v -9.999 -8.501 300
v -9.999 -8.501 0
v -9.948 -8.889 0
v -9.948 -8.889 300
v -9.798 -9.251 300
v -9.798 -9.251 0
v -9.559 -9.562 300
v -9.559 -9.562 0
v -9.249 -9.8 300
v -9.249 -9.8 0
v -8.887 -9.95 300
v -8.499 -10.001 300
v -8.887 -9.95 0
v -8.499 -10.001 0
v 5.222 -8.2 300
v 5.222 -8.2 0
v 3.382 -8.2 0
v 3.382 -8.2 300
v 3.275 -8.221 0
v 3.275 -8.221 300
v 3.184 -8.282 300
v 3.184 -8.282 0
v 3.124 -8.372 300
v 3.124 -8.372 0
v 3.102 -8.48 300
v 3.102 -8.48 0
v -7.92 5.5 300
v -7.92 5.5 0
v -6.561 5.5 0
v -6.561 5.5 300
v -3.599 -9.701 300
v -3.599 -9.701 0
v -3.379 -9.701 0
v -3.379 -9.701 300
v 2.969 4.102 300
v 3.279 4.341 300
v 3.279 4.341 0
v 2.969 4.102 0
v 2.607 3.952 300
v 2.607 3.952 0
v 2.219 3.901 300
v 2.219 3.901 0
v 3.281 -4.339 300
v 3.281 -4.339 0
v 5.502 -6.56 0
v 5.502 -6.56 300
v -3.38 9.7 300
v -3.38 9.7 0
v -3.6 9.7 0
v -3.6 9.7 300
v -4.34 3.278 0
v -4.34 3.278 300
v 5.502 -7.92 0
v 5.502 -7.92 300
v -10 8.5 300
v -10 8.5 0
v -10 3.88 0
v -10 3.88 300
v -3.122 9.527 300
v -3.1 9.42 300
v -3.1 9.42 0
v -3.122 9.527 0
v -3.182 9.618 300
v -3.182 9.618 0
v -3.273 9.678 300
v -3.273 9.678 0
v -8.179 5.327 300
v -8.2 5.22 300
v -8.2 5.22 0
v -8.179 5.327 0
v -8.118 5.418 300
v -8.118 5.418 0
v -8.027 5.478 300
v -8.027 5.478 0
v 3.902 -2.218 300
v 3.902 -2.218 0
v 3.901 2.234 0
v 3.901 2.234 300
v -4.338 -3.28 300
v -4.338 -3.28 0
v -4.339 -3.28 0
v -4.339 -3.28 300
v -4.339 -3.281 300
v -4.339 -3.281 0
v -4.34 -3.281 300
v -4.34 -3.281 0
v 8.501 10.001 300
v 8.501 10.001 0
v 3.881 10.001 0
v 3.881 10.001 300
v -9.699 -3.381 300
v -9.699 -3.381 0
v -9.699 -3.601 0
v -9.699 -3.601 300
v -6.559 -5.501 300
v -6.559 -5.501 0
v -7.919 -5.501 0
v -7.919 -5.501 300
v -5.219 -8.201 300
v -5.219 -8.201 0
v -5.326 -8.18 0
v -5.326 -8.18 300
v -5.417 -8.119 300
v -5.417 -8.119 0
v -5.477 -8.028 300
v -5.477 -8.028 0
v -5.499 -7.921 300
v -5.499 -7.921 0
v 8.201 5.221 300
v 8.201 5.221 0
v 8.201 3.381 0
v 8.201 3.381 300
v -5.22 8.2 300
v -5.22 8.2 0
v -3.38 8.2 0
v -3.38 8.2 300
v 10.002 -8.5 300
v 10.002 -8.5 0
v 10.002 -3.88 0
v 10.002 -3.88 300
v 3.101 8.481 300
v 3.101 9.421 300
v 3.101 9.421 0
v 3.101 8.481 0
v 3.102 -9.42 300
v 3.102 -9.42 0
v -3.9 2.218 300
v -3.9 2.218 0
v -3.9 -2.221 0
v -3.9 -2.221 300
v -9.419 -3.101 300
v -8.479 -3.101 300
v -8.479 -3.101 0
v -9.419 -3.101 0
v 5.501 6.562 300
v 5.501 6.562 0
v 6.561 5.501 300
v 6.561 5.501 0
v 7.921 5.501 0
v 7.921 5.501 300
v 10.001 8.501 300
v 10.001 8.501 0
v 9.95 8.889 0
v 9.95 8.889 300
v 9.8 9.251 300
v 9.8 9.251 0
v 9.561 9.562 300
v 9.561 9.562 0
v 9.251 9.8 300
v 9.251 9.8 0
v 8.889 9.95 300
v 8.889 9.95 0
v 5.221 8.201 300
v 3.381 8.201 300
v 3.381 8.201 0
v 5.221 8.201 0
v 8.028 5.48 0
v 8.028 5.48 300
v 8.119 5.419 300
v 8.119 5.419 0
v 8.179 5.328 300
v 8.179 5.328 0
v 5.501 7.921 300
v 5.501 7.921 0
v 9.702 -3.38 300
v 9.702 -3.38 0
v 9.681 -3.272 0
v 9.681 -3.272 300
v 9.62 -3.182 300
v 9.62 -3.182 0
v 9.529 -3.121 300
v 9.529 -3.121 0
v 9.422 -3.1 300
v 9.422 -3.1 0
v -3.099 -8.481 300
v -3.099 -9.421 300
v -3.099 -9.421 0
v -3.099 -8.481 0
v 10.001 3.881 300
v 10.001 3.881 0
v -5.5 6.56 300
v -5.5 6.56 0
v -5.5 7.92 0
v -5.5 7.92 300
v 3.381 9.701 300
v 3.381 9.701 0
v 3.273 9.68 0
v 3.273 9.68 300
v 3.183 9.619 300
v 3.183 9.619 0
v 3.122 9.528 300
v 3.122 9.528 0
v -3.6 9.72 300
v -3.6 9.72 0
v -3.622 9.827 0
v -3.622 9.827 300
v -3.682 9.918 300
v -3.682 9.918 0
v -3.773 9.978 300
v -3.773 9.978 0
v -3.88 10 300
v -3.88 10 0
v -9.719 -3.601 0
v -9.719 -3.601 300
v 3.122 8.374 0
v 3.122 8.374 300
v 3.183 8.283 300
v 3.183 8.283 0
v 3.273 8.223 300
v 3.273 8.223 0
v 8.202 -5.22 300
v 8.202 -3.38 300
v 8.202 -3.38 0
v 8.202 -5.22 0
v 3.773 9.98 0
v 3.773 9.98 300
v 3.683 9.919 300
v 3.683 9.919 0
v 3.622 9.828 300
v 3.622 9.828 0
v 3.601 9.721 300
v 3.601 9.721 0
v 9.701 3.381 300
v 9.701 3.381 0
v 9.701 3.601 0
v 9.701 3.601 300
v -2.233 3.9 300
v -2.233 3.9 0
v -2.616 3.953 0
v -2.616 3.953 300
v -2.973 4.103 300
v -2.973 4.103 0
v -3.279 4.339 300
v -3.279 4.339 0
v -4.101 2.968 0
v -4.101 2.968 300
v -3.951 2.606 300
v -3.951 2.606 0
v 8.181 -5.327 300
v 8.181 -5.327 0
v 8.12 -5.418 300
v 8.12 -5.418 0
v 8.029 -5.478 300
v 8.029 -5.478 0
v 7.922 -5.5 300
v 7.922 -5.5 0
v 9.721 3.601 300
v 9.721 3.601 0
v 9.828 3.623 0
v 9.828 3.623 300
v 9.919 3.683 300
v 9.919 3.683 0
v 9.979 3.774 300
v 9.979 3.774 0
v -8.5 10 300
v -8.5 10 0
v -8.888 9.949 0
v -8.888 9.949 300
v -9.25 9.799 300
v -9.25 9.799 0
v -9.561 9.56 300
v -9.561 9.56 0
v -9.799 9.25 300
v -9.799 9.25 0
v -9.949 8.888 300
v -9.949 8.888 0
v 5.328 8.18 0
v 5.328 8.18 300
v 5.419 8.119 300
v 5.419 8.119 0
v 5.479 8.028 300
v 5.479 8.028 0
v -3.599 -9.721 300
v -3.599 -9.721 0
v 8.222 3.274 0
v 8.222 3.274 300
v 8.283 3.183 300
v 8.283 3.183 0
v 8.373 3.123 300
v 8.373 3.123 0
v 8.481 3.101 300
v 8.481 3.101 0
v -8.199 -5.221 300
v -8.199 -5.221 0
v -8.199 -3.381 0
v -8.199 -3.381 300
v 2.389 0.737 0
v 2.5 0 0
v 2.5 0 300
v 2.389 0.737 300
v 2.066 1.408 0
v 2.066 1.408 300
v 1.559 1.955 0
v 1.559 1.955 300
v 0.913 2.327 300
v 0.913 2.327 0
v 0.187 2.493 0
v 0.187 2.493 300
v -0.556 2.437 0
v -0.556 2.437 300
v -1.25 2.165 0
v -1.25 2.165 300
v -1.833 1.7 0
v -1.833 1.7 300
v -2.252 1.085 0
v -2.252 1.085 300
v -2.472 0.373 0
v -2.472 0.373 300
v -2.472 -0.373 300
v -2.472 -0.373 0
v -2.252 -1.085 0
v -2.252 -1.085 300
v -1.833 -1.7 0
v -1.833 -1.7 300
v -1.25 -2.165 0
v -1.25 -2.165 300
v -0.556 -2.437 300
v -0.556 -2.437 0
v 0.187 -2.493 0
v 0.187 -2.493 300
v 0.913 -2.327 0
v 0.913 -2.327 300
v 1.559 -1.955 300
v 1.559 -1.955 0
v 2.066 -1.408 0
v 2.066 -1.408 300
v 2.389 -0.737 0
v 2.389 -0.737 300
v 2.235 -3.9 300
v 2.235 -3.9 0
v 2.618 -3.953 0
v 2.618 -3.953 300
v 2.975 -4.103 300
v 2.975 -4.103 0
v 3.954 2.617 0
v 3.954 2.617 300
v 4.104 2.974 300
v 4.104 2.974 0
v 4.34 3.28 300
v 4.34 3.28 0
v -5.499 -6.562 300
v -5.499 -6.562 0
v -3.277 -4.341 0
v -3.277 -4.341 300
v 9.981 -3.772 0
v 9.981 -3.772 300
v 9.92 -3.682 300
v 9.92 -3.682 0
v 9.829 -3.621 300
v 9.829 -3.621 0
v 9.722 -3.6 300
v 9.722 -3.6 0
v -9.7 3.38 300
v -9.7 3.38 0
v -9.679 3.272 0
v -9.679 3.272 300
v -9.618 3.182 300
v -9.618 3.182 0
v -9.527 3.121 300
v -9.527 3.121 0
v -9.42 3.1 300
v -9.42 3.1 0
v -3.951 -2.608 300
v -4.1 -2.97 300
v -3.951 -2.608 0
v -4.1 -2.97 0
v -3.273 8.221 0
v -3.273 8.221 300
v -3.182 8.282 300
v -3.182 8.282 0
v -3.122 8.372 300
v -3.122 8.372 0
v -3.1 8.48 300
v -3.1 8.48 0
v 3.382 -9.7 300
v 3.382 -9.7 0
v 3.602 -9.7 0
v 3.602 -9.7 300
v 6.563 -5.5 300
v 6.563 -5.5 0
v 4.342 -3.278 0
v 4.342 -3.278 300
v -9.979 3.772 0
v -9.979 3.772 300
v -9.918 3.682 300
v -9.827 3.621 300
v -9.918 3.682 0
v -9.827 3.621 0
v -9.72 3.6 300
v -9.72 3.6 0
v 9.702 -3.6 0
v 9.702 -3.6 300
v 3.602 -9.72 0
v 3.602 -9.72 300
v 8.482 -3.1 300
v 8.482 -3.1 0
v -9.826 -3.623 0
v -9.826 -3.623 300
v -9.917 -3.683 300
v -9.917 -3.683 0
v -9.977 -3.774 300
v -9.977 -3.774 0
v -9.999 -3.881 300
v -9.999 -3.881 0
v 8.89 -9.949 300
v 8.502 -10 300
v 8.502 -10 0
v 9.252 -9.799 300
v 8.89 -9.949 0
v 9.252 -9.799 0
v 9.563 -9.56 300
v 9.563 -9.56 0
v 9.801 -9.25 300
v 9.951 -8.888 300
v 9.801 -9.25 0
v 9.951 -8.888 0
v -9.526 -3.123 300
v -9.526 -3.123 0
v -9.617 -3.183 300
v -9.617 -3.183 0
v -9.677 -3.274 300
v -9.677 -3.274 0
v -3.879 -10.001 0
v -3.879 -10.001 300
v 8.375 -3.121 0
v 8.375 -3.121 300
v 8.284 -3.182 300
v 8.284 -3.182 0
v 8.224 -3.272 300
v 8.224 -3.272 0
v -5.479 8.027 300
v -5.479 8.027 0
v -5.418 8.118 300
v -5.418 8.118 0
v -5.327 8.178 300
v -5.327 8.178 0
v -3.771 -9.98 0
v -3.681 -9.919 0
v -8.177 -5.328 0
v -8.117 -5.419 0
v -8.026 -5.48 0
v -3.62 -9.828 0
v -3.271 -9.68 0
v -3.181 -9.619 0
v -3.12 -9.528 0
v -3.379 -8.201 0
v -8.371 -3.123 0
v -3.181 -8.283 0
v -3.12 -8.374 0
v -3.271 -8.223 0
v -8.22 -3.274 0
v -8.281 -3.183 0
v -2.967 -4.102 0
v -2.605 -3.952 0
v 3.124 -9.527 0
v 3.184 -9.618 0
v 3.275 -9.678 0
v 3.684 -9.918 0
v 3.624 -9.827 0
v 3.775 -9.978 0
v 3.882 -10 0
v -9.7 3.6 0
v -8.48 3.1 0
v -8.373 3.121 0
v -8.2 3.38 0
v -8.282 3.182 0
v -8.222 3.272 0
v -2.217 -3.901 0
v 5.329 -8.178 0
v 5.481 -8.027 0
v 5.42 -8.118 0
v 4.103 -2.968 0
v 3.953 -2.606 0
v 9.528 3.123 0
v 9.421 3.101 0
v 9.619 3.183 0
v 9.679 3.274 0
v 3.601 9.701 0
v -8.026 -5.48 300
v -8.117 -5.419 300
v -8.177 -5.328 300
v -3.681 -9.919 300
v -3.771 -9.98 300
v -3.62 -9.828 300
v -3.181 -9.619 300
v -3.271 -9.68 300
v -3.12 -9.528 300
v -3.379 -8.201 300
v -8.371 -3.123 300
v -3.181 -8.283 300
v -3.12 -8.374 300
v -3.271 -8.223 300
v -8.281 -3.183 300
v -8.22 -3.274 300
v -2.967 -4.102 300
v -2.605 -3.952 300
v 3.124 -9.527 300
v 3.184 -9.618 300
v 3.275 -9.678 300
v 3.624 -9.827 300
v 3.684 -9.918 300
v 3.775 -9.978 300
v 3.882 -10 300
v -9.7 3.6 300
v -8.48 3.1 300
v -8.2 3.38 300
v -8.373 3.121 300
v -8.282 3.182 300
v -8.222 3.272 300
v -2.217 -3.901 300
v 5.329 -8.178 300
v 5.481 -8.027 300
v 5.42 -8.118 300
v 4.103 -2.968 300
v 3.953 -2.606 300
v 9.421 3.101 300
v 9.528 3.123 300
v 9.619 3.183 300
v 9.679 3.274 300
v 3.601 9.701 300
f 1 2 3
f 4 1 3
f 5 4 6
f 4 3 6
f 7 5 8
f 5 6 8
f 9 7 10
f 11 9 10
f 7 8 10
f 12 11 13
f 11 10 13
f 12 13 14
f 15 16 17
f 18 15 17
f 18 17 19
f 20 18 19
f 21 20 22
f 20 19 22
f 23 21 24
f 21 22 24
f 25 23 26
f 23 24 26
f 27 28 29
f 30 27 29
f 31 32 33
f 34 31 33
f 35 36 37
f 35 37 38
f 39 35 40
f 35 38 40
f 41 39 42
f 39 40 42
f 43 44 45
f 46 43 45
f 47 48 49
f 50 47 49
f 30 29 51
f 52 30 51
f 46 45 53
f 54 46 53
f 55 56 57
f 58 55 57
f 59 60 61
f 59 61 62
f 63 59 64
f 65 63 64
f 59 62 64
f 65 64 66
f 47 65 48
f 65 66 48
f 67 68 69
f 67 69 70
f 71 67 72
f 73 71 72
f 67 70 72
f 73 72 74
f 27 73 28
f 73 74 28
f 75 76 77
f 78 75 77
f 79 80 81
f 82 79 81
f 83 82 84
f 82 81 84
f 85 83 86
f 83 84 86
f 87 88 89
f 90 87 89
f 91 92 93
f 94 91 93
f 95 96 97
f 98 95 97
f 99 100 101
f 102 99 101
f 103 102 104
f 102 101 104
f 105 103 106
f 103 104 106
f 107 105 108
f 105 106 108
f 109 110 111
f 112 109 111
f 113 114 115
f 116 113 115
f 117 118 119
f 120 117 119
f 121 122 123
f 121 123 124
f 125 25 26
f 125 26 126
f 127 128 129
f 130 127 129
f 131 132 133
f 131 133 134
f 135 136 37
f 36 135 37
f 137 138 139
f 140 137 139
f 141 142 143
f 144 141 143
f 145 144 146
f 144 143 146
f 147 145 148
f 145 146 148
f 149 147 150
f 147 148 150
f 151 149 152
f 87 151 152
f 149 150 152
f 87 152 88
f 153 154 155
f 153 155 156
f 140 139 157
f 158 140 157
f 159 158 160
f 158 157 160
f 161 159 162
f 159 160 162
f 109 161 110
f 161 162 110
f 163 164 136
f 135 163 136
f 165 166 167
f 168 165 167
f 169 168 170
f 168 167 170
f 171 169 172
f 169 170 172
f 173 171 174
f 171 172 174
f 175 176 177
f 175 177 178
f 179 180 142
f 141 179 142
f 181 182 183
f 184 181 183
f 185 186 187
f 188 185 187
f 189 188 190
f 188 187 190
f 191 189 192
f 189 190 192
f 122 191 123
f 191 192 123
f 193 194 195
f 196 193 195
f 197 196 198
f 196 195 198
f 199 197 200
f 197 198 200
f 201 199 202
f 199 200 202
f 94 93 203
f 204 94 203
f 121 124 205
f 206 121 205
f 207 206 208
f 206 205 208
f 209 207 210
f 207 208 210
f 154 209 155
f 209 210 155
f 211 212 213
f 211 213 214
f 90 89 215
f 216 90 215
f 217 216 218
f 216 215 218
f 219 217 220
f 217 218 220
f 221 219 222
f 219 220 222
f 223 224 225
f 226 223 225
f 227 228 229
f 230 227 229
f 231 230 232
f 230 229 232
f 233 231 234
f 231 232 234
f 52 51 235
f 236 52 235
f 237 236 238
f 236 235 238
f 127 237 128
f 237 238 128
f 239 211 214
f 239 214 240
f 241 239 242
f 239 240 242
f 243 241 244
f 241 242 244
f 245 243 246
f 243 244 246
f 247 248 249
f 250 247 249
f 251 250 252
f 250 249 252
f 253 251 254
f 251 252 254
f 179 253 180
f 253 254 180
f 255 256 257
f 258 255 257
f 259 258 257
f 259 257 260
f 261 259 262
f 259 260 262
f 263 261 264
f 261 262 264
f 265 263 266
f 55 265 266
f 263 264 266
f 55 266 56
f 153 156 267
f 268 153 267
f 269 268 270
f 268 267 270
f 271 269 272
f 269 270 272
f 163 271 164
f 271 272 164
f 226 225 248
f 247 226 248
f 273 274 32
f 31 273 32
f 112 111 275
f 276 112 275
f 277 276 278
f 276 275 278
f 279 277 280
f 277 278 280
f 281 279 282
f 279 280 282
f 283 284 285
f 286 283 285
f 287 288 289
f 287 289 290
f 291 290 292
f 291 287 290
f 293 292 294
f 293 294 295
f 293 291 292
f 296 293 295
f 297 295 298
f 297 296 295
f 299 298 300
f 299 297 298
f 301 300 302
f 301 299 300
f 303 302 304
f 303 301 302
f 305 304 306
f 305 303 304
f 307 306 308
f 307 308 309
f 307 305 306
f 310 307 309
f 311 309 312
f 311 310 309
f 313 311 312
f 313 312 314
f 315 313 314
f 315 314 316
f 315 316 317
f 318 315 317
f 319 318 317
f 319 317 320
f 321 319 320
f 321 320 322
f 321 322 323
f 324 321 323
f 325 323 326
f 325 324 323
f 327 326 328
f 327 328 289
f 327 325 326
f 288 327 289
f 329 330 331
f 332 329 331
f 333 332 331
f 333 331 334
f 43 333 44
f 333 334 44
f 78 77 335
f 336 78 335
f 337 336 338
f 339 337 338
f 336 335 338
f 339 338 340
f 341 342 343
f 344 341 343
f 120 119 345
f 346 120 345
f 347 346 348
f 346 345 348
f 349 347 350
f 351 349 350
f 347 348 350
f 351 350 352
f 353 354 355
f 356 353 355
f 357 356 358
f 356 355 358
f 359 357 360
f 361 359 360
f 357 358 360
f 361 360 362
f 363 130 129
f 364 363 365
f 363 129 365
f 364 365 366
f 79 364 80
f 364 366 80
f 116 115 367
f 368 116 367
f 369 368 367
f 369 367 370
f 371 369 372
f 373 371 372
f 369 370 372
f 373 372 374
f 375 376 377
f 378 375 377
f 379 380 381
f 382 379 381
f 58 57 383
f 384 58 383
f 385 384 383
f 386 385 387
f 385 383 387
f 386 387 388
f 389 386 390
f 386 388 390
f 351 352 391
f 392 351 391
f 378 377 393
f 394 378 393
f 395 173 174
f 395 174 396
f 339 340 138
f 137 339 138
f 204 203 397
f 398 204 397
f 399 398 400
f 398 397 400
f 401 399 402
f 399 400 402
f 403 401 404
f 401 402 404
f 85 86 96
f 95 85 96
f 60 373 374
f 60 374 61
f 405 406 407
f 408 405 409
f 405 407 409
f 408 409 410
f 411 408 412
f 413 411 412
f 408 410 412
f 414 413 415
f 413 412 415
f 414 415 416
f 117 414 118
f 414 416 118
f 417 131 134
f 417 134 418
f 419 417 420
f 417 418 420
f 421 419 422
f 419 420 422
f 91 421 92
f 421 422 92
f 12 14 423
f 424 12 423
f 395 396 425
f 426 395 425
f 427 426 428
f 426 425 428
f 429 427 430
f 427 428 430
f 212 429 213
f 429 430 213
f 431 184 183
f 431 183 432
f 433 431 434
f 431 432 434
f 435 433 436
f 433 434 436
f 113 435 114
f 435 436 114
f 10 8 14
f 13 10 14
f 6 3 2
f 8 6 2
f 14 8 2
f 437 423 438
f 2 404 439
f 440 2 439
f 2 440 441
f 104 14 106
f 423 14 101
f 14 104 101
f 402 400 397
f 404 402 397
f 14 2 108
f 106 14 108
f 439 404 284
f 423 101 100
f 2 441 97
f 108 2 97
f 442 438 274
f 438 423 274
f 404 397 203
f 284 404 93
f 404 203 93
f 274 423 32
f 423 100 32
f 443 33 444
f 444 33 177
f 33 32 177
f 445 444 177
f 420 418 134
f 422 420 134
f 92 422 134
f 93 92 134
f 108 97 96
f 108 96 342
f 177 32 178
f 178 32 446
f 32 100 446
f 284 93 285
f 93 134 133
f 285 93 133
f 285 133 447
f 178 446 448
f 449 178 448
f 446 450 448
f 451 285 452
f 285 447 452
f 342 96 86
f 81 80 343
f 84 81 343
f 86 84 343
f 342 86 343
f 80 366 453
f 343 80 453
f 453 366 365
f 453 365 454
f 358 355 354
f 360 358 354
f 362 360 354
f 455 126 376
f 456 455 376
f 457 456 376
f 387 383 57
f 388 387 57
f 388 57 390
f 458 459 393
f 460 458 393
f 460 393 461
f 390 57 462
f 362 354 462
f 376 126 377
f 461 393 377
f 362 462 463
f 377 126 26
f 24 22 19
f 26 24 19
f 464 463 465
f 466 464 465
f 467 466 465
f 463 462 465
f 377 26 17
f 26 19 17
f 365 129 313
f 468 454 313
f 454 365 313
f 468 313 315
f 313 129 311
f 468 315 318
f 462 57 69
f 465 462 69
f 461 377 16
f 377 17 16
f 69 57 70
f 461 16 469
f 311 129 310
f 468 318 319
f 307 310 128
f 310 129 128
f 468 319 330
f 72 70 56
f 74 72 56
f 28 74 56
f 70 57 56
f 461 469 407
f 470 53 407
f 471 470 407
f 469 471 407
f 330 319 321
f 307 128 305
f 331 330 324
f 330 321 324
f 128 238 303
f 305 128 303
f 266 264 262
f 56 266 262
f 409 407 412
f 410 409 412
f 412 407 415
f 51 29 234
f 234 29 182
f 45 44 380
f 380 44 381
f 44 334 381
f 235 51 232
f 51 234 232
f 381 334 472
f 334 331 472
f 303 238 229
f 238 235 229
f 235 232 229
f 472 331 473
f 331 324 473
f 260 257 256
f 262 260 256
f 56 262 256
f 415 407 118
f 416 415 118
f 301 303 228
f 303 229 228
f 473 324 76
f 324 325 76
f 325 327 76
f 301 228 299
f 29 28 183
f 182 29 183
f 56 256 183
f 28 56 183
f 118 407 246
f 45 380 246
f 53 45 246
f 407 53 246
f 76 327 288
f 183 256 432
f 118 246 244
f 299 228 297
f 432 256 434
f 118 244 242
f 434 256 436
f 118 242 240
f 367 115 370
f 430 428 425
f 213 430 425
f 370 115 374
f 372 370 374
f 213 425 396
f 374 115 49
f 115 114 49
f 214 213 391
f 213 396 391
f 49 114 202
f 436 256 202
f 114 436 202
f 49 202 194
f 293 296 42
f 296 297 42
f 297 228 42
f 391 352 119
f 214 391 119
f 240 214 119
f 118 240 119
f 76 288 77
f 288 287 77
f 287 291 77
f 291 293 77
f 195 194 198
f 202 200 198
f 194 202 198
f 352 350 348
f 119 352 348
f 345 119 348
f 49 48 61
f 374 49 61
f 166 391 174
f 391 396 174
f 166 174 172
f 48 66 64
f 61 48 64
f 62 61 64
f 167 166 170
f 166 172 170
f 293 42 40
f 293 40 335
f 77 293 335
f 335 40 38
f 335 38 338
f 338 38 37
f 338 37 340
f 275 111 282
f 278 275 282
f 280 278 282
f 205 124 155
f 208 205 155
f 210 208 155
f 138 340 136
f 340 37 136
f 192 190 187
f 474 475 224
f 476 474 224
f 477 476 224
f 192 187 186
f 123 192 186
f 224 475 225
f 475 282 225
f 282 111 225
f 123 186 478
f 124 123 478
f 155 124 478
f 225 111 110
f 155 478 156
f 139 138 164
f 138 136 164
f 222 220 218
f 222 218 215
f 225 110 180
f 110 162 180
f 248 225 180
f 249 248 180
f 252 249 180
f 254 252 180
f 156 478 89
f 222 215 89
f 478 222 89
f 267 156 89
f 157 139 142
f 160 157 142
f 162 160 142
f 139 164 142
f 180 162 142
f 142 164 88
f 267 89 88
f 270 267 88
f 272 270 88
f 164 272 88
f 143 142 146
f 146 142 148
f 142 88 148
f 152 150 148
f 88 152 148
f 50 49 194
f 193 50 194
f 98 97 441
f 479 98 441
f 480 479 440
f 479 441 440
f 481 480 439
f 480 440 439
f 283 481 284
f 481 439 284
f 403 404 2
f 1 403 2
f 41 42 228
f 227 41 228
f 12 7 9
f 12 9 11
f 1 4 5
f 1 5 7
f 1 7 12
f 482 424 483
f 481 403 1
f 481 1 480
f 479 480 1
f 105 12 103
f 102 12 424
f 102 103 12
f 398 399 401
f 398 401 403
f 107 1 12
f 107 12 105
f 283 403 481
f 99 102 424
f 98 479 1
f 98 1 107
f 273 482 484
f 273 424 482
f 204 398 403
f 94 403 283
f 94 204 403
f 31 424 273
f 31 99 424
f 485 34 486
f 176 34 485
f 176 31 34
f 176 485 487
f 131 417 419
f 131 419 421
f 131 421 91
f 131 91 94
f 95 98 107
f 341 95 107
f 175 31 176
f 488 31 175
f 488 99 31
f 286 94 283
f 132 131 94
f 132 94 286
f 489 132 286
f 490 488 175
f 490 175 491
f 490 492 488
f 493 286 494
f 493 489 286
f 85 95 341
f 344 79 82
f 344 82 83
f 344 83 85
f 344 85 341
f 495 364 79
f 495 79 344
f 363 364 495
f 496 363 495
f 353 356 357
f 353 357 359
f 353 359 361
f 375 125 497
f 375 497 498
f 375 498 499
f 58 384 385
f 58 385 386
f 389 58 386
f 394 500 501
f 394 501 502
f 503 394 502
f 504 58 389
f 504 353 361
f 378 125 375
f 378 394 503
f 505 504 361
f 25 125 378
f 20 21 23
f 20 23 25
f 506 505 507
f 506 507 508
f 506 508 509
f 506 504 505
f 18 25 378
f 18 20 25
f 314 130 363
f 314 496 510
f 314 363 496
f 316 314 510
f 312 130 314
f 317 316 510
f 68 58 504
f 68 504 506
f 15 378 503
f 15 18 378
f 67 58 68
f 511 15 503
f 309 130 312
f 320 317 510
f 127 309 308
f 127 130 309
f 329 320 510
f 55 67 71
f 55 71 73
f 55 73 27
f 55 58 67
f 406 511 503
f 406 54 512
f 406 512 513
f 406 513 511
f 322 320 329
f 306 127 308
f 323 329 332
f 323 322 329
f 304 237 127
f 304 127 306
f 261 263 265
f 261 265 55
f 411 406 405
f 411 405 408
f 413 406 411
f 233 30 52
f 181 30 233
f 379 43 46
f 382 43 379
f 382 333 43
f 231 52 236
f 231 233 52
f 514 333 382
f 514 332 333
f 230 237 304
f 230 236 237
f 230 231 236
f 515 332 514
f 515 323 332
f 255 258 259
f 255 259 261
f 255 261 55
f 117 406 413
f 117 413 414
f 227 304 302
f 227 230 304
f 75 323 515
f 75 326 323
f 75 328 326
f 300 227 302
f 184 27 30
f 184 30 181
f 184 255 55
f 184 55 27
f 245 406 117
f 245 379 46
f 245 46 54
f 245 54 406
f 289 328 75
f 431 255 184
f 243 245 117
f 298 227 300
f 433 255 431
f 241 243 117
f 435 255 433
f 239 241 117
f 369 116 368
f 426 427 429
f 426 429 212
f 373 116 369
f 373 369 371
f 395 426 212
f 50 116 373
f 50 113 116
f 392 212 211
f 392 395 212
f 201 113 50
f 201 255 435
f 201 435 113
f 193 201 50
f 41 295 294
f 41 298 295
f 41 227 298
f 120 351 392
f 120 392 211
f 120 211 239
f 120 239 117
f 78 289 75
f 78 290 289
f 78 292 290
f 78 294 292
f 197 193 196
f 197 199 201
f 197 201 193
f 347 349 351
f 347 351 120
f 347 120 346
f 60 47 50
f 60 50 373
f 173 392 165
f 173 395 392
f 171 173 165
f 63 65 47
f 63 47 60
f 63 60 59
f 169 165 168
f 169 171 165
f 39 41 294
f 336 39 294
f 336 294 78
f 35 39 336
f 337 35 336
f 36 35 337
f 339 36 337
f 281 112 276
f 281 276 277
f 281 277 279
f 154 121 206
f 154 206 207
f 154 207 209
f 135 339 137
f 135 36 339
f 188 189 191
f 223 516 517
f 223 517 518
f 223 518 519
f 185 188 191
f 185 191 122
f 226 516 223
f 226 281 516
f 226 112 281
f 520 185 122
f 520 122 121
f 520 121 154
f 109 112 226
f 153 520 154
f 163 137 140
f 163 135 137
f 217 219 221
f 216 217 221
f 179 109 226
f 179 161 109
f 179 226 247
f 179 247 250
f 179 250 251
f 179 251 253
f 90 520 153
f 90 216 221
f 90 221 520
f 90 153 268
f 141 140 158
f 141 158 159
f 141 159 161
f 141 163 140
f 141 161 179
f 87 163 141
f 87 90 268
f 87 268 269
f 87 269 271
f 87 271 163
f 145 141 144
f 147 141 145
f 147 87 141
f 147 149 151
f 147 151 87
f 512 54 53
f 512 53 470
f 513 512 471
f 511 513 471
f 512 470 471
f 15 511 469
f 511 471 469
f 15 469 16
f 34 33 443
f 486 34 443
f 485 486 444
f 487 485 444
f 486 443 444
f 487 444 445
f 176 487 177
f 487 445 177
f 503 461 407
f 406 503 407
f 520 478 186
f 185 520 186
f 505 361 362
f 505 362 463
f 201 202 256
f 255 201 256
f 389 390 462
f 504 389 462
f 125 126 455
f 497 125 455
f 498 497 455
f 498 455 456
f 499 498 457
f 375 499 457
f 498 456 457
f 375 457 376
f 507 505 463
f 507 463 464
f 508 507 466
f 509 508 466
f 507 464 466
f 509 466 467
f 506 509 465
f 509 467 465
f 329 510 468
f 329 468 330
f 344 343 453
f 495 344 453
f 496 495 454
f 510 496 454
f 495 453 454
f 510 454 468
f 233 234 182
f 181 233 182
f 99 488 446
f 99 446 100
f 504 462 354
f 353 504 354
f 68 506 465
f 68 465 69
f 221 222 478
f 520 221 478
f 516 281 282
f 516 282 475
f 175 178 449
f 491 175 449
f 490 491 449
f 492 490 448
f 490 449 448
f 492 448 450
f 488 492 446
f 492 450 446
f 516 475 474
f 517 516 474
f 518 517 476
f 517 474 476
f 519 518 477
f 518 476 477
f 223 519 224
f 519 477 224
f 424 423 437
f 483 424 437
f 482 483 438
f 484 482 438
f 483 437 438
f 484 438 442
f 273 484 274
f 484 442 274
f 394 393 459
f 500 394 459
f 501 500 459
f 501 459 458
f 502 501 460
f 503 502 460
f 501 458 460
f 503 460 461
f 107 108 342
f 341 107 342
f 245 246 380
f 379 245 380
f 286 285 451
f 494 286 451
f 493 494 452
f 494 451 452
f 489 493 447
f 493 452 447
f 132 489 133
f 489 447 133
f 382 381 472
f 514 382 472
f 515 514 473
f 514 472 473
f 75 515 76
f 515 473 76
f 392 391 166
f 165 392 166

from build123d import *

# Parameters (mm, degrees)
BOSS_EXTRUDE1_DEPTH = 300
F_3DSKETCH2_R       = 2.5
CUT_EXTRUDE1_DEPTH  = 301.333261686


with BuildPart() as part:
    # Sketch1 → Boss-Extrude1 (new body)
    with BuildSketch(Plane.XY):
        with BuildLine():
            ThreePointArc((-4.339541497, 3.27832502), (-4.01438237, 2.791689997), (-3.900201668, 2.217664848))
            Line((-3.900201668, 2.217664848), (-3.900201668, -2.220777458))
            ThreePointArc((-3.900201668, -2.220777458), (-4.013982246, -2.793835668), (-4.338062619, -3.279956687))
            ThreePointArc((-4.338062619, -3.279956687), (-4.338801799, -3.280697416), (-4.339541497, -3.28143763))
            Line((-4.339541497, -3.28143763), (-6.559305445, -5.501201578))
            Line((-6.559305445, -5.501201578), (-7.918645273, -5.501201578))
            ThreePointArc((-7.918645273, -5.501201578), (-8.116635172, -5.419191476), (-8.198645273, -5.221201578))
            Line((-8.198645273, -5.221201578), (-8.198645273, -3.381201578))
            ThreePointArc((-8.198645273, -3.381201578), (-8.280655374, -3.183211679), (-8.478645273, -3.101201578))
            Line((-8.478645273, -3.101201578), (-9.418645273, -3.101201578))
            ThreePointArc((-9.418645273, -3.101201578), (-9.616635172, -3.183211679), (-9.698645273, -3.381201578))
            Line((-9.698645273, -3.381201578), (-9.698645273, -3.601201578))
            Line((-9.698645273, -3.601201578), (-9.718645273, -3.601201578))
            ThreePointArc((-9.718645273, -3.601201578), (-9.916635172, -3.683211679), (-9.998645273, -3.881201578))
            Line((-9.998645273, -3.881201578), (-9.998645273, -8.501201578))
            ThreePointArc((-9.998645273, -8.501201578), (-9.559305445, -9.561861749), (-8.498645273, -10.001201578))
            Line((-8.498645273, -10.001201578), (-3.878645273, -10.001201578))
            ThreePointArc((-3.878645273, -10.001201578), (-3.680655374, -9.919191476), (-3.598645273, -9.721201578))
            Line((-3.598645273, -9.721201578), (-3.598645273, -9.701201578))
            Line((-3.598645273, -9.701201578), (-3.378645273, -9.701201578))
            ThreePointArc((-3.378645273, -9.701201578), (-3.180655374, -9.619191476), (-3.098645273, -9.421201578))
            Line((-3.098645273, -9.421201578), (-3.098645273, -8.481201578))
            ThreePointArc((-3.098645273, -8.481201578), (-3.180655374, -8.283211679), (-3.378645273, -8.201201578))
            Line((-3.378645273, -8.201201578), (-5.218645273, -8.201201578))
            ThreePointArc((-5.218645273, -8.201201578), (-5.416635172, -8.119191476), (-5.498645273, -7.921201578))
            Line((-5.498645273, -7.921201578), (-5.498645273, -6.561861749))
            Line((-5.498645273, -6.561861749), (-3.277324929, -4.340541406))
            ThreePointArc((-3.277324929, -4.340541406), (-2.790689906, -4.015382279), (-2.216664757, -3.901201578))
            Line((-2.216664757, -3.901201578), (2.234977304, -3.899793498))
            ThreePointArc((2.234977304, -3.899793498), (2.801097117, -4.016727825), (3.280957809, -4.339061494))
            Line((3.280957809, -4.339061494), (5.502201668, -6.560305354))
            Line((5.502201668, -6.560305354), (5.502201668, -7.919645182))
            ThreePointArc((5.502201668, -7.919645182), (5.420191567, -8.117635081), (5.222201668, -8.199645182))
            Line((5.222201668, -8.199645182), (3.382201668, -8.199645182))
            ThreePointArc((3.382201668, -8.199645182), (3.18421177, -8.281655283), (3.102201668, -8.479645182))
            Line((3.102201668, -8.479645182), (3.102201668, -9.419645182))
            ThreePointArc((3.102201668, -9.419645182), (3.18421177, -9.617635081), (3.382201668, -9.699645182))
            Line((3.382201668, -9.699645182), (3.602201668, -9.699645182))
            Line((3.602201668, -9.699645182), (3.602201668, -9.719645182))
            ThreePointArc((3.602201668, -9.719645182), (3.68421177, -9.917635081), (3.882201668, -9.999645182))
            Line((3.882201668, -9.999645182), (8.502201668, -9.999645182))
            ThreePointArc((8.502201668, -9.999645182), (9.56286184, -9.560305354), (10.002201668, -8.499645182))
            Line((10.002201668, -8.499645182), (10.002201668, -3.879645182))
            ThreePointArc((10.002201668, -3.879645182), (9.920191567, -3.681655283), (9.722201668, -3.599645182))
            Line((9.722201668, -3.599645182), (9.702201668, -3.599645182))
            Line((9.702201668, -3.599645182), (9.702201668, -3.379645182))
            ThreePointArc((9.702201668, -3.379645182), (9.620191567, -3.181655283), (9.422201668, -3.099645182))
            Line((9.422201668, -3.099645182), (8.482201668, -3.099645182))
            ThreePointArc((8.482201668, -3.099645182), (8.28421177, -3.181655283), (8.202201668, -3.379645182))
            Line((8.202201668, -3.379645182), (8.202201668, -5.219645182))
            ThreePointArc((8.202201668, -5.219645182), (8.120191567, -5.417635081), (7.922201668, -5.499645182))
            Line((7.922201668, -5.499645182), (6.56286184, -5.499645182))
            Line((6.56286184, -5.499645182), (4.341541497, -3.278324838))
            ThreePointArc((4.341541497, -3.278324838), (4.01638237, -2.791689815), (3.902201668, -2.217664667))
            Line((3.902201668, -2.217664667), (3.900793589, 2.233977395))
            ThreePointArc((3.900793589, 2.233977395), (4.017727916, 2.800097207), (4.340061585, 3.2799579))
            Line((4.340061585, 3.2799579), (6.561305445, 5.501201759))
            Line((6.561305445, 5.501201759), (7.920645273, 5.501201759))
            ThreePointArc((7.920645273, 5.501201759), (8.118635172, 5.419191658), (8.200645273, 5.221201759))
            Line((8.200645273, 5.221201759), (8.200645273, 3.381201759))
            ThreePointArc((8.200645273, 3.381201759), (8.282655374, 3.183211861), (8.480645273, 3.101201759))
            Line((8.480645273, 3.101201759), (9.420645273, 3.101201759))
            ThreePointArc((9.420645273, 3.101201759), (9.618635172, 3.183211861), (9.700645273, 3.381201759))
            Line((9.700645273, 3.381201759), (9.700645273, 3.601201759))
            Line((9.700645273, 3.601201759), (9.720645273, 3.601201759))
            ThreePointArc((9.720645273, 3.601201759), (9.918635172, 3.683211861), (10.000645273, 3.881201759))
            Line((10.000645273, 3.881201759), (10.000645273, 8.501201759))
            ThreePointArc((10.000645273, 8.501201759), (9.561305445, 9.561861931), (8.500645273, 10.001201759))
            Line((8.500645273, 10.001201759), (3.880645273, 10.001201759))
            ThreePointArc((3.880645273, 10.001201759), (3.682655374, 9.919191658), (3.600645273, 9.721201759))
            Line((3.600645273, 9.721201759), (3.600645273, 9.701201759))
            Line((3.600645273, 9.701201759), (3.380645273, 9.701201759))
            ThreePointArc((3.380645273, 9.701201759), (3.182655374, 9.619191658), (3.100645273, 9.421201759))
            Line((3.100645273, 9.421201759), (3.100645273, 8.481201759))
            ThreePointArc((3.100645273, 8.481201759), (3.182655374, 8.283211861), (3.380645273, 8.201201759))
            Line((3.380645273, 8.201201759), (5.220645273, 8.201201759))
            ThreePointArc((5.220645273, 8.201201759), (5.418635172, 8.119191658), (5.500645273, 7.921201759))
            Line((5.500645273, 7.921201759), (5.500645273, 6.561861931))
            Line((5.500645273, 6.561861931), (3.279324929, 4.340541588))
            ThreePointArc((3.279324929, 4.340541588), (2.792689906, 4.015382461), (2.218664757, 3.901201759))
            Line((2.218664757, 3.901201759), (-2.232977304, 3.89979368))
            ThreePointArc((-2.232977304, 3.89979368), (-2.799097117, 4.016728006), (-3.278957809, 4.339061676))
            Line((-3.278957809, 4.339061676), (-5.500201668, 6.560305535))
            Line((-5.500201668, 6.560305535), (-5.500201668, 7.919645364))
            ThreePointArc((-5.500201668, 7.919645364), (-5.418191567, 8.117635262), (-5.220201668, 8.199645364))
            Line((-5.220201668, 8.199645364), (-3.380201668, 8.199645364))
            ThreePointArc((-3.380201668, 8.199645364), (-3.18221177, 8.281655465), (-3.100201668, 8.479645364))
            Line((-3.100201668, 8.479645364), (-3.100201668, 9.419645364))
            ThreePointArc((-3.100201668, 9.419645364), (-3.18221177, 9.617635262), (-3.380201668, 9.699645364))
            Line((-3.380201668, 9.699645364), (-3.600201668, 9.699645364))
            Line((-3.600201668, 9.699645364), (-3.600201668, 9.719645364))
            ThreePointArc((-3.600201668, 9.719645364), (-3.68221177, 9.917635262), (-3.880201668, 9.999645364))
            Line((-3.880201668, 9.999645364), (-8.500201668, 9.999645364))
            ThreePointArc((-8.500201668, 9.999645364), (-9.56086184, 9.560305535), (-10.000201668, 8.499645364))
            Line((-10.000201668, 8.499645364), (-10.000201668, 3.879645364))
            ThreePointArc((-10.000201668, 3.879645364), (-9.918191567, 3.681655465), (-9.720201668, 3.599645364))
            Line((-9.720201668, 3.599645364), (-9.700201668, 3.599645364))
            Line((-9.700201668, 3.599645364), (-9.700201668, 3.379645364))
            ThreePointArc((-9.700201668, 3.379645364), (-9.618191567, 3.181655465), (-9.420201668, 3.099645364))
            Line((-9.420201668, 3.099645364), (-8.480201668, 3.099645364))
            ThreePointArc((-8.480201668, 3.099645364), (-8.28221177, 3.181655465), (-8.200201668, 3.379645364))
            Line((-8.200201668, 3.379645364), (-8.200201668, 5.219645364))
            ThreePointArc((-8.200201668, 5.219645364), (-8.118191567, 5.417635262), (-7.920201668, 5.499645364))
            Line((-7.920201668, 5.499645364), (-6.56086184, 5.499645364))
            Line((-6.56086184, 5.499645364), (-4.339541497, 3.27832502))
        make_face()
    extrude(amount=BOSS_EXTRUDE1_DEPTH)

    # 3DSketch2 → Cut-Extrude1 (cut, through all)
    with BuildSketch(Plane.XY):
        Circle(F_3DSKETCH2_R)
    extrude(amount=CUT_EXTRUDE1_DEPTH, mode=Mode.SUBTRACT)


solid = part.part
